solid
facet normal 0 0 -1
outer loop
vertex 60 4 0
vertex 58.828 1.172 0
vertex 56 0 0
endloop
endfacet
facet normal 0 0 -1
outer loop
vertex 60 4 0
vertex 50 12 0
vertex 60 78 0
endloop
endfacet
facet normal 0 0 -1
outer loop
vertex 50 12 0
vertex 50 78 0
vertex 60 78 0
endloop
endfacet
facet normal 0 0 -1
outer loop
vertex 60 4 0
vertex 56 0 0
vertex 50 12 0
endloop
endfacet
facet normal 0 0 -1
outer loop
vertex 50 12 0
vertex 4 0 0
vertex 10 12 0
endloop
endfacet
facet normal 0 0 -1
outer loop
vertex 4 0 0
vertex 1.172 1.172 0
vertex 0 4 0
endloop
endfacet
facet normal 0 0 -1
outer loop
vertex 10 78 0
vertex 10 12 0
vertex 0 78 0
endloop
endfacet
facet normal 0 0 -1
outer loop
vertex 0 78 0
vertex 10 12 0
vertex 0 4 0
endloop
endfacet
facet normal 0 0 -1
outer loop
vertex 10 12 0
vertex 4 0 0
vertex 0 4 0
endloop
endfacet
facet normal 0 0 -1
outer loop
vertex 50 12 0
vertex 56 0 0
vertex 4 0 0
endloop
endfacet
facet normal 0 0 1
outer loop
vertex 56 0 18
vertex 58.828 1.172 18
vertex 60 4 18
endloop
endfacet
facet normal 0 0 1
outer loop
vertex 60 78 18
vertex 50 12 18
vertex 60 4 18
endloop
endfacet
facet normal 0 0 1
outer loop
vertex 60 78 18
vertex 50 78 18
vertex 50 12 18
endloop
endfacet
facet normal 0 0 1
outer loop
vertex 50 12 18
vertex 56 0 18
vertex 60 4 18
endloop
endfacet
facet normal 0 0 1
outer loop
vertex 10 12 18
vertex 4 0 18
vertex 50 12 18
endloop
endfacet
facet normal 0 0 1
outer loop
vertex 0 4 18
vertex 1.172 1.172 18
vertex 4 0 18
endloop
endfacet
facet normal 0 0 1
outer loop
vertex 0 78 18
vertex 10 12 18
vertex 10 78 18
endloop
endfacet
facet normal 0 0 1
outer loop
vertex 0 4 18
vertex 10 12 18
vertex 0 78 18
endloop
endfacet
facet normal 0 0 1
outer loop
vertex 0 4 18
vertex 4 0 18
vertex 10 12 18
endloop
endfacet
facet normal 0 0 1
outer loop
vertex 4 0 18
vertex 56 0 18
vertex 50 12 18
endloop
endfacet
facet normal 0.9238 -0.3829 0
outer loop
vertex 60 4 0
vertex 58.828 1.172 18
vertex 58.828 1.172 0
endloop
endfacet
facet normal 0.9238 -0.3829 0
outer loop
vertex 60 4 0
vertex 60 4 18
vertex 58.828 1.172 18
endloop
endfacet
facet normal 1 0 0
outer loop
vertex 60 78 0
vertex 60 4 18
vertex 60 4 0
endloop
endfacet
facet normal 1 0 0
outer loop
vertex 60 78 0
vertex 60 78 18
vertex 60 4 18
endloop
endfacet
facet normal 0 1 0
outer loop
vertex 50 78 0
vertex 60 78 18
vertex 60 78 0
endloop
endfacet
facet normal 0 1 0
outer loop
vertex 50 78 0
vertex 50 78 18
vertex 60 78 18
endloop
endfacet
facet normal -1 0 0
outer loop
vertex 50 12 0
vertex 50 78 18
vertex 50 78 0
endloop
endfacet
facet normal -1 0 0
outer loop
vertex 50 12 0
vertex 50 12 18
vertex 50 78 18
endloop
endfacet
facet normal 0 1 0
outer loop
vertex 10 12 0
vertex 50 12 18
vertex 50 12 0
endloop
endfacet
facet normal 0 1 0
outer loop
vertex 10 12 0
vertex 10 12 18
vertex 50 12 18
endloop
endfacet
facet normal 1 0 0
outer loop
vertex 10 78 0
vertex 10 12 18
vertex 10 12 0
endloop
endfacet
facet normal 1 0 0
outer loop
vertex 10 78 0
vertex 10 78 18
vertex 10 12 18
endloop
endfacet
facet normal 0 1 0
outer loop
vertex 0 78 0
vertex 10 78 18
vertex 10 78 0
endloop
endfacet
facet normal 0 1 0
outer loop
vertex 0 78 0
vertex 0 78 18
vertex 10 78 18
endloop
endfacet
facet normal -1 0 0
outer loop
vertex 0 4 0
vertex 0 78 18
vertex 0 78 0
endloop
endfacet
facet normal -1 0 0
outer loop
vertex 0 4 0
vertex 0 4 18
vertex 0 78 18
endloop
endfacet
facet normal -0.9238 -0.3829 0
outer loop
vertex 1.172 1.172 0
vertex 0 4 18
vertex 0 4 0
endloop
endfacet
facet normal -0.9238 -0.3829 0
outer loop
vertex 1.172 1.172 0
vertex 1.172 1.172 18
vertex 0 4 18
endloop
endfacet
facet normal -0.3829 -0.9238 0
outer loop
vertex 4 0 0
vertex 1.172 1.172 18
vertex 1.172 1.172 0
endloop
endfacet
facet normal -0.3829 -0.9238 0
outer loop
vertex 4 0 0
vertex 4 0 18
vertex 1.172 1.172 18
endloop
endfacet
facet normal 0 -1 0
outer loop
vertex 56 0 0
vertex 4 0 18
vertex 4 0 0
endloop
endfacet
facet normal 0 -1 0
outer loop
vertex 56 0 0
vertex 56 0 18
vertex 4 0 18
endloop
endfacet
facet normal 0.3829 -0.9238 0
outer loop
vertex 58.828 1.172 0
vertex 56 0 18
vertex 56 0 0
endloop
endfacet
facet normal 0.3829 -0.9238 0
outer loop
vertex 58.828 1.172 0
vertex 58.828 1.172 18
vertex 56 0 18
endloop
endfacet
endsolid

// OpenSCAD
$fn = 32;

// ----------------------------------------------------------------------
// Heat sink frame: 60 x 78 mm frame, 10 mm walls
// ----------------------------------------------------------------------

// --- parameters (mm) ---
profile_height = 18;      // extrusion height
profile_points = 12;      // points of the closed outline

profile = [[0, 4], [1.172, 1.172], [4, 0], [56, 0], [58.828, 1.172], [60, 4], [60, 78], [50, 78], [50, 12], [10, 12], [10, 78], [0, 78]];  // single closed polygon, 12 points, counter clockwise

// --- the one profile operation ---
linear_extrude(height = profile_height) polygon(points = profile);
